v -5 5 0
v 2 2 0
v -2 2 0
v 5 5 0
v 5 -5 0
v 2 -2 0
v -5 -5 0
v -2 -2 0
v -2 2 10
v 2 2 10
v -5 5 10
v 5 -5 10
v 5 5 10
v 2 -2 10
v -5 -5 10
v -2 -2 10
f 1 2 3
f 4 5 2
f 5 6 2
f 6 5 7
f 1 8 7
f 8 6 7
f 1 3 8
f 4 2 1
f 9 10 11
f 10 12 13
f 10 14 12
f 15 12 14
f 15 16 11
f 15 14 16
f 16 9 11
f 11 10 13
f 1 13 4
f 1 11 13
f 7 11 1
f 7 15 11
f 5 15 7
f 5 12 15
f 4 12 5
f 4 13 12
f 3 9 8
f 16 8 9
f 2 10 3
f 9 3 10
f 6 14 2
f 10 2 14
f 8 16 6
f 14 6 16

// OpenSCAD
// segments= applies to each outline separately: both the outer square and
// the hole get 8 vertices per ring.
linear_extrude(height = 10, segments = 8)
  difference() {
    square(10, center = true);
    square(4, center = true);
  }
